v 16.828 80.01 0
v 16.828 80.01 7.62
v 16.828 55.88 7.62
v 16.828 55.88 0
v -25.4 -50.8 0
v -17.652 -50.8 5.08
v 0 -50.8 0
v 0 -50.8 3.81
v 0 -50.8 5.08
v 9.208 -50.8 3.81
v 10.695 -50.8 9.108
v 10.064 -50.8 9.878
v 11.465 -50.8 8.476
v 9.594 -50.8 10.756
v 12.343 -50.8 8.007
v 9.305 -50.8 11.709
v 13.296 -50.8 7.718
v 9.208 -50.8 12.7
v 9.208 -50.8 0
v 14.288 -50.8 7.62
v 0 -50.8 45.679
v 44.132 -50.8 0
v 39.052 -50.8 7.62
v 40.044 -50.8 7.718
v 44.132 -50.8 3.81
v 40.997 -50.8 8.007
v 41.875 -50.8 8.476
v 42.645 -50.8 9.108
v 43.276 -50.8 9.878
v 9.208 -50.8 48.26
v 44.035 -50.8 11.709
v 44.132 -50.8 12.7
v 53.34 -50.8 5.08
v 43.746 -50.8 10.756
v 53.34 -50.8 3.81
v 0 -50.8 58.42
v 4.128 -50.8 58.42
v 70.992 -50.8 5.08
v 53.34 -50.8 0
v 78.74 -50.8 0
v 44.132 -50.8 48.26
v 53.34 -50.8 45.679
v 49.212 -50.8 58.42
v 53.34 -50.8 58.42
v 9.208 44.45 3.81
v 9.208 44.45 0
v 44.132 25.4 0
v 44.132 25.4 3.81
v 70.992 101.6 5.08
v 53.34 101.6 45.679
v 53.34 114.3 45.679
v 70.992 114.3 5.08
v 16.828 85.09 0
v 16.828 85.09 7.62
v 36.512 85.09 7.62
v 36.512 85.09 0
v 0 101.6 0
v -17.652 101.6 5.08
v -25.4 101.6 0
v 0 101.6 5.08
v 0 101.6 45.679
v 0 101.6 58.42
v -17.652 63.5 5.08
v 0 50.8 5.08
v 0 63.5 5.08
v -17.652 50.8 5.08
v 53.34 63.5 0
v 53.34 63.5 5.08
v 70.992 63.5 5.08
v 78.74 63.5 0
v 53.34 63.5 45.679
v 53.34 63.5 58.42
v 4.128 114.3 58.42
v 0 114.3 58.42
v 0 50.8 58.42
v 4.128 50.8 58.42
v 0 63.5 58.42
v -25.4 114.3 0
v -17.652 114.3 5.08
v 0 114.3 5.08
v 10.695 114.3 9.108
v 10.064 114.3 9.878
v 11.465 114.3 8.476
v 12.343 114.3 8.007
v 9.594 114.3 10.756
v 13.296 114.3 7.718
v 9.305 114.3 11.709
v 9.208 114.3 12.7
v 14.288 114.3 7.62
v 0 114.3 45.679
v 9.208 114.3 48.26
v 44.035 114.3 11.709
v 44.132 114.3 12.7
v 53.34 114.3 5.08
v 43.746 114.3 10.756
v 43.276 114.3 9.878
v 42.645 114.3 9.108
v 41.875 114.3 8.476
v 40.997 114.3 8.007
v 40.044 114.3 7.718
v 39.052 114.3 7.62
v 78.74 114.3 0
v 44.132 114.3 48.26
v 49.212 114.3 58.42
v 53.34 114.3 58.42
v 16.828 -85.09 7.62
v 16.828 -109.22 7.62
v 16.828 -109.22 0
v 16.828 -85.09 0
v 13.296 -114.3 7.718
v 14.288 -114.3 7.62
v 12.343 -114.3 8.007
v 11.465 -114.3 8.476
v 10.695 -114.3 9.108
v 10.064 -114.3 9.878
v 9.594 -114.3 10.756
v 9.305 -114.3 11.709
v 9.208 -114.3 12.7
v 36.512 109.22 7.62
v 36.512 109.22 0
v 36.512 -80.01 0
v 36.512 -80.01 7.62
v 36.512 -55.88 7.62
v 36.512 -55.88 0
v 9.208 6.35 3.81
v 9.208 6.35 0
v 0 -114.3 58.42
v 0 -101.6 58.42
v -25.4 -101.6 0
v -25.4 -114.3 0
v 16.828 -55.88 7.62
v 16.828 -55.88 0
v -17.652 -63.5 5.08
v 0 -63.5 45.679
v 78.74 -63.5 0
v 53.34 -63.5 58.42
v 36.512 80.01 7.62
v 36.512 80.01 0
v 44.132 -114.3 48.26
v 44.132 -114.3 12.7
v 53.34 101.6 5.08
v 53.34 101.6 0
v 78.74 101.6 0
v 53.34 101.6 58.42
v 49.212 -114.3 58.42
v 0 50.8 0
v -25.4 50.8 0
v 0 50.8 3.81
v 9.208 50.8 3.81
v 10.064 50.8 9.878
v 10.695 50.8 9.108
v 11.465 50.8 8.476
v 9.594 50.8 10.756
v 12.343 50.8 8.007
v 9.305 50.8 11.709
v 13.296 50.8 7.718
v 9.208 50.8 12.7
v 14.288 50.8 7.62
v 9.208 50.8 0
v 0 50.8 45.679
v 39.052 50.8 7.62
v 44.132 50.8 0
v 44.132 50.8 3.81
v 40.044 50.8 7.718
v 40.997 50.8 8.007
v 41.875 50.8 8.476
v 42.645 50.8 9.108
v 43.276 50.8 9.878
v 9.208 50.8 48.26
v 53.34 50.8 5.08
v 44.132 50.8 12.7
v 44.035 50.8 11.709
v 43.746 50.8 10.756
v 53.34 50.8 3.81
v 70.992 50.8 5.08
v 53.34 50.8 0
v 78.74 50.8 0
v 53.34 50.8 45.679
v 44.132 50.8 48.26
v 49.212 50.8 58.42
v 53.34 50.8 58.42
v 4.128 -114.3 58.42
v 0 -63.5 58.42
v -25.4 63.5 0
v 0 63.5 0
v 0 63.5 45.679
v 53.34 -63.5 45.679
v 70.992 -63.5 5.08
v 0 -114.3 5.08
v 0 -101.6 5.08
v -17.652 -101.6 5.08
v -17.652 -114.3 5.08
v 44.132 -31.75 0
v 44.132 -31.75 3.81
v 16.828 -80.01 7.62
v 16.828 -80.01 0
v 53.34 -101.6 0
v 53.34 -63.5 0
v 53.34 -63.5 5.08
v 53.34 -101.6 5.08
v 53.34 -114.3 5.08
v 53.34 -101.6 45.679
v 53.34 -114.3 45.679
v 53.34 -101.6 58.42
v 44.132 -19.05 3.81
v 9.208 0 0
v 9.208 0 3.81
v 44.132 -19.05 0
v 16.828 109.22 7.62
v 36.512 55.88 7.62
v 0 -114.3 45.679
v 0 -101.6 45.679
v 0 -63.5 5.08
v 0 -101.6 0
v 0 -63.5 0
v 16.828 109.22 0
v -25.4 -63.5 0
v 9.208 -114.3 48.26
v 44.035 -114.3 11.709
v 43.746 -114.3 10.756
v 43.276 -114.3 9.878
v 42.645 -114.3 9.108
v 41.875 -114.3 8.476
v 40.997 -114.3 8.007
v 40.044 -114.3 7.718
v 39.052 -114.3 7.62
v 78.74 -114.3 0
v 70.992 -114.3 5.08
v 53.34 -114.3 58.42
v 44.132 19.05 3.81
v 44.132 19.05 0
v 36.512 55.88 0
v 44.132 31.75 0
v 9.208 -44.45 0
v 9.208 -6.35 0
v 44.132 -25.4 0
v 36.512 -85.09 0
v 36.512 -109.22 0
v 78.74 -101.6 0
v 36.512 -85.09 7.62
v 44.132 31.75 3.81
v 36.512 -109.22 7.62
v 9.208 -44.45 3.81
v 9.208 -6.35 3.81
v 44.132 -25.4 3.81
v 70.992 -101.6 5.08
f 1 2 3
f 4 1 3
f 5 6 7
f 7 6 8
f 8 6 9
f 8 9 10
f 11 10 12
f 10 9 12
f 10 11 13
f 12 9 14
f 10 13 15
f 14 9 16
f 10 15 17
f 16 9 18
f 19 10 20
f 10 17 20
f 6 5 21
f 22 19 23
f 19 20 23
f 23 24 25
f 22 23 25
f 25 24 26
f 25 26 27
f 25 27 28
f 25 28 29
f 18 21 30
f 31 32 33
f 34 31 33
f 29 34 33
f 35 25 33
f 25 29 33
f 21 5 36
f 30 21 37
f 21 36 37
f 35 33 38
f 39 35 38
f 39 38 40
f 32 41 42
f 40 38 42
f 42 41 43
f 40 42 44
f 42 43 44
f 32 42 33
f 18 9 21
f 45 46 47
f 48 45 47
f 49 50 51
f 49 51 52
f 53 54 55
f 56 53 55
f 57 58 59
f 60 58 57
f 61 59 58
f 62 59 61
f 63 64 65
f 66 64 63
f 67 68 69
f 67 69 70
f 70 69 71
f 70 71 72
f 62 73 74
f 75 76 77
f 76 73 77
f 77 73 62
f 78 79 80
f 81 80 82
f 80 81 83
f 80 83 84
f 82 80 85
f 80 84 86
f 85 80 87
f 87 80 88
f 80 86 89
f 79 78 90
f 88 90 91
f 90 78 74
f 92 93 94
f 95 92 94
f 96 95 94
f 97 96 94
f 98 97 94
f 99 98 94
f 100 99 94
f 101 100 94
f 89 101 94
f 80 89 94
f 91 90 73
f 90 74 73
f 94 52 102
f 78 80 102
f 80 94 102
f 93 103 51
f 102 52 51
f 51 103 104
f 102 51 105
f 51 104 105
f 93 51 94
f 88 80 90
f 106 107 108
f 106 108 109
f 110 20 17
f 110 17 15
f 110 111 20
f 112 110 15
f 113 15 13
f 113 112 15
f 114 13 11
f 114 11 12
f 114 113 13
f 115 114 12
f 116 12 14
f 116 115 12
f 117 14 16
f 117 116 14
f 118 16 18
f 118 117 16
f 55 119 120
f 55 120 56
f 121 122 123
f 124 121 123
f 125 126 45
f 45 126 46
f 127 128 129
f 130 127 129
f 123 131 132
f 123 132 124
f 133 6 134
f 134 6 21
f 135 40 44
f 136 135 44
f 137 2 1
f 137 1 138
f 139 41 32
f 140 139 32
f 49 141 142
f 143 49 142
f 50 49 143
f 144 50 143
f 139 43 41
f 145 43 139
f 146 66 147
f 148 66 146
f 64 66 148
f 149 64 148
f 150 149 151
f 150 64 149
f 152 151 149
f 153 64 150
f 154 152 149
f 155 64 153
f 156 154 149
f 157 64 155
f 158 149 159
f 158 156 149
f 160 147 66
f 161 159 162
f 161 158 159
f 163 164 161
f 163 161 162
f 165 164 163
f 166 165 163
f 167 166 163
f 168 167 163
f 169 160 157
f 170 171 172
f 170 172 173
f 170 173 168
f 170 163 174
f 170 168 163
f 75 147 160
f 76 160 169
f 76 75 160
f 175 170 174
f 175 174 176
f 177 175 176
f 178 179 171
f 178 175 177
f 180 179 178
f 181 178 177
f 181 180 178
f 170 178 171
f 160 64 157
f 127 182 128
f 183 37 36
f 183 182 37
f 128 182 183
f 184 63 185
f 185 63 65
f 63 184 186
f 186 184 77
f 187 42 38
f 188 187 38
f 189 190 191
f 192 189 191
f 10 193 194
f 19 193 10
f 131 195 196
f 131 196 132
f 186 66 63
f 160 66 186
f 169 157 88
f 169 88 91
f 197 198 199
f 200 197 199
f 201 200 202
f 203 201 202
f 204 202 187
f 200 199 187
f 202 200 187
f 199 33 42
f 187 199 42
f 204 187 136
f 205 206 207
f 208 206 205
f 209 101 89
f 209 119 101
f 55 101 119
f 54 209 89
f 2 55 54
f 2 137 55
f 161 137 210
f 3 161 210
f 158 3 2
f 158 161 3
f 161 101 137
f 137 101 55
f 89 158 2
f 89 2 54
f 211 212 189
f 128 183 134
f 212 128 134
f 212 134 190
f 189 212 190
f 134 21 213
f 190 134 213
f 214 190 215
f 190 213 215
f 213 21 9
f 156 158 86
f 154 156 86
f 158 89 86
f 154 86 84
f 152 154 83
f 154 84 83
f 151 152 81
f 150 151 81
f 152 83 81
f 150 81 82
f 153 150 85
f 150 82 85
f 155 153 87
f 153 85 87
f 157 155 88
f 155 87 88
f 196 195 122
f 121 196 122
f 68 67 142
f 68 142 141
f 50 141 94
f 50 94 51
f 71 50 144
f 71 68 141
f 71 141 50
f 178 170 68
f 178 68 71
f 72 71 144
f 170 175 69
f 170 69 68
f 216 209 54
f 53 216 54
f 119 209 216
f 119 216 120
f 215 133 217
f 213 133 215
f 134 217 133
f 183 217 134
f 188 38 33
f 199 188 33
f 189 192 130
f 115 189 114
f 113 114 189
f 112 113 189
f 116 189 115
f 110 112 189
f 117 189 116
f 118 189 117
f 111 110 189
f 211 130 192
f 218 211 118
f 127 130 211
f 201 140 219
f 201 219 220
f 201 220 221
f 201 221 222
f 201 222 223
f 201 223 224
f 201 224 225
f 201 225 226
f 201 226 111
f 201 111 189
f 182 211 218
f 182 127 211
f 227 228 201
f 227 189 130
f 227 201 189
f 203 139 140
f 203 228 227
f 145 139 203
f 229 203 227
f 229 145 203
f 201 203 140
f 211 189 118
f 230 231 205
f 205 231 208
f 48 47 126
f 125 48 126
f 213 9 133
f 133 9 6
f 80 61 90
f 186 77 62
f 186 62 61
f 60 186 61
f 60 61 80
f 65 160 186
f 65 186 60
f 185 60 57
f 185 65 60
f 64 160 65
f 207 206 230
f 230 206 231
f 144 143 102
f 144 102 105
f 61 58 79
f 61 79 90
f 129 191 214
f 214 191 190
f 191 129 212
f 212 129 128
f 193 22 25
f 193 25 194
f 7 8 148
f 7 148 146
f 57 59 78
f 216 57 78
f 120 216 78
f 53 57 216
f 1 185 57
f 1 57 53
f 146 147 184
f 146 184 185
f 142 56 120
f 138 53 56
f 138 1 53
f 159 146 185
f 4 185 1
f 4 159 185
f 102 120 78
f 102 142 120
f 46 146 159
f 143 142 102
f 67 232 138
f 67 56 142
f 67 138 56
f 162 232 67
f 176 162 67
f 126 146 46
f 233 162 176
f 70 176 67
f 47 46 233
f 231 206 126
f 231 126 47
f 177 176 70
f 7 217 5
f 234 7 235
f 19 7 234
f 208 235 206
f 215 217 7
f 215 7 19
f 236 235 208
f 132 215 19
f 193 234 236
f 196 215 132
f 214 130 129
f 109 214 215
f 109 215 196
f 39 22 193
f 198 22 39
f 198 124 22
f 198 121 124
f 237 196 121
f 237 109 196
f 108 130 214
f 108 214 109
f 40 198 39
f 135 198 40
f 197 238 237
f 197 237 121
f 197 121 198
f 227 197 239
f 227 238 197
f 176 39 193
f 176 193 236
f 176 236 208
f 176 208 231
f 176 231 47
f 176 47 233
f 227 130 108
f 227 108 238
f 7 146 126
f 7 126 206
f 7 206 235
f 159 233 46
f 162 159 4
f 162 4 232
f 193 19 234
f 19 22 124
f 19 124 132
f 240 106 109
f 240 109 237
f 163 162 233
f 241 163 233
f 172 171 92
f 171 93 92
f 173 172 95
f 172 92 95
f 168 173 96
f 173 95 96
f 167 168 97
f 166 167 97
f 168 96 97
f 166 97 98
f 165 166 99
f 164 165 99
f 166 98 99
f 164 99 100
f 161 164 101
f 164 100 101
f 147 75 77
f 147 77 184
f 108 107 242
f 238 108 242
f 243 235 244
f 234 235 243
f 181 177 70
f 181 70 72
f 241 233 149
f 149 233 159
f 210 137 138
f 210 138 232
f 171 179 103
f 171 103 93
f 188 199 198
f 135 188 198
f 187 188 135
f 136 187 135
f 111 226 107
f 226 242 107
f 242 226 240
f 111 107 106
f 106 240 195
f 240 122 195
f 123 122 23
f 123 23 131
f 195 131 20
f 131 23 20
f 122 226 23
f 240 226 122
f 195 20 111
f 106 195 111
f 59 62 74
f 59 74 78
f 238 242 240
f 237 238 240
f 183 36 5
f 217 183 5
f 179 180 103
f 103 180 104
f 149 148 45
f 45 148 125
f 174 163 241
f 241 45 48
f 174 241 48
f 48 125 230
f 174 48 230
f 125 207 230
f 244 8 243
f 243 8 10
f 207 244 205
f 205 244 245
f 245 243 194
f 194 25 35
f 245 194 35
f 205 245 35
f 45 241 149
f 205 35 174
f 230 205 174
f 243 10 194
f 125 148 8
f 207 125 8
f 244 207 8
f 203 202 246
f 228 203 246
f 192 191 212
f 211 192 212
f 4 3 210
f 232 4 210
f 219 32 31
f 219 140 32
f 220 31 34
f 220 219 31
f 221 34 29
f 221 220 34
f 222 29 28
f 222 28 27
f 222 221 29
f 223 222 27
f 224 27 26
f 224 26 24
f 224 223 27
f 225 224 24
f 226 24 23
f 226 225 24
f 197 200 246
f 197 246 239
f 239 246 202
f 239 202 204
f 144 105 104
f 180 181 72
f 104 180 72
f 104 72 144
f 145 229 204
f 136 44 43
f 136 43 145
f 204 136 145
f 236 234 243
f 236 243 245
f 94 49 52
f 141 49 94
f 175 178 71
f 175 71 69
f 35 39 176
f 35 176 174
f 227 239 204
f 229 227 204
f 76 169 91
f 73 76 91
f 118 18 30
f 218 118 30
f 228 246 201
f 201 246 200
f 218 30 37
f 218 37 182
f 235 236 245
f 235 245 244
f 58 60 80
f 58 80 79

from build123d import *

# Parameters (mm, degrees)
F1_DEPTH  = 114.3
F3_START  = 101.6
F3_DEPTH  = 12.7
F4_START  = 50.8
F4_DEPTH  = 12.7
F6_START  = 3.81
F5_W      = 53.34
F5_H      = 50.8
F6_DEPTH  = 54.61
F8_DEPTH  = 3.81
F9_R      = 5.08
F10_SIZE2 = 10.16
F10_SIZE  = 5.08
F11_SIZE2 = 5.08
F11_SIZE  = 10.16
F12_W     = 19.685
F12_H     = 24.13
F13_DEPTH = 7.62


with BuildPart() as f1:
    # F0 (on Front) → F1 (new body)
    with BuildSketch(Plane.XZ):
        Polygon((0, 58.42), (0, 0), (53.34, 0), (53.34, 58.42), (44.1325, 58.42), (44.1325, 7.62), (26.67, 7.62), (9.2075, 7.62), (9.2075, 58.42), align=None)
    extrude(amount=F1_DEPTH)

    # F2 (on Front) → F3 (join)
    with BuildSketch(Plane.XZ.offset(F3_START)):
        Polygon((78.74, 0), (53.34, 58.42), (53.34, 45.6794248168), (70.9919238334, 5.08), (53.34, 5.08), (53.34, 0), align=None)
        Polygon((-25.4, 0), (0, 0), (0, 5.08), (-17.6519238334, 5.08), (0, 45.6794248168), (0, 58.42), align=None)
    extrude(amount=F3_DEPTH)

    # F2 (on Front) → F4 (join)
    with BuildSketch(Plane.XZ.offset(F4_START)):
        Polygon((78.74, 0), (53.34, 58.42), (53.34, 45.6794248168), (70.9919238334, 5.08), (53.34, 5.08), (53.34, 0), align=None)
        Polygon((-25.4, 0), (0, 0), (0, 5.08), (-17.6519238334, 5.08), (0, 45.6794248168), (0, 58.42), align=None)
    extrude(amount=F4_DEPTH)

    # F5 (on Top) → F6 (cut)
    with BuildSketch(Plane.XY.offset(F6_START)):
        with Locations((26.67, -25.4)):
            Rectangle(F5_W, F5_H)
    extrude(amount=F6_DEPTH, mode=Mode.SUBTRACT)

    # F7 (on face) → F8 (cut, through all)
    with BuildSketch(Plane.XY):
        Polygon((44.1325, -31.75), (9.2075, -50.8), (44.1325, -50.8), align=None)
        Polygon((44.1325, -25.4), (9.2075, -6.35), (9.2075, -44.45), align=None)
        Polygon((44.1325, 0), (9.2075, 0), (44.1325, -19.05), align=None)
    extrude(amount=F8_DEPTH, mode=Mode.SUBTRACT)

    # F9
    f9_edges = [f1.edges().sort_by_distance(p)[0] for p in [
        (9.2075, -82.55, 7.62),
        (44.1325, -82.55, 7.62),
    ]]
    fillet(f9_edges, radius=F9_R)

    # F10
    f10_edges = [f1.edges().sort_by_distance(p)[0] for p in [
        (9.2075, -82.55, 58.42),
    ]]
    f10_side = f1.faces().sort_by_distance((4.60375, -82.55, 58.42))[0]
    chamfer(f10_edges, length=F10_SIZE, length2=F10_SIZE2, reference=f10_side)

    # F11
    f11_edges = [f1.edges().sort_by_distance(p)[0] for p in [
        (44.1325, -82.55, 58.42),
    ]]
    f11_side = f1.faces().sort_by_distance((44.1325, -82.55, 35.56))[0]
    chamfer(f11_edges, length=F11_SIZE, length2=F11_SIZE2, reference=f11_side)

    # F12 (on face) → F13 (cut, through all)
    with BuildSketch(Plane.XY.offset(7.62)):
        with Locations((26.67, -67.945)):
            Rectangle(F12_W, F12_H)
        with Locations((26.67, -97.155)):
            Rectangle(F12_W, F12_H)
    extrude(amount=-F13_DEPTH, mode=Mode.SUBTRACT)

    # F14: F1 across plane


with BuildPart() as f1_1:
    add(f1.part)
    add(f1.part.mirror(Plane.XZ))


solid = f1_1.part
